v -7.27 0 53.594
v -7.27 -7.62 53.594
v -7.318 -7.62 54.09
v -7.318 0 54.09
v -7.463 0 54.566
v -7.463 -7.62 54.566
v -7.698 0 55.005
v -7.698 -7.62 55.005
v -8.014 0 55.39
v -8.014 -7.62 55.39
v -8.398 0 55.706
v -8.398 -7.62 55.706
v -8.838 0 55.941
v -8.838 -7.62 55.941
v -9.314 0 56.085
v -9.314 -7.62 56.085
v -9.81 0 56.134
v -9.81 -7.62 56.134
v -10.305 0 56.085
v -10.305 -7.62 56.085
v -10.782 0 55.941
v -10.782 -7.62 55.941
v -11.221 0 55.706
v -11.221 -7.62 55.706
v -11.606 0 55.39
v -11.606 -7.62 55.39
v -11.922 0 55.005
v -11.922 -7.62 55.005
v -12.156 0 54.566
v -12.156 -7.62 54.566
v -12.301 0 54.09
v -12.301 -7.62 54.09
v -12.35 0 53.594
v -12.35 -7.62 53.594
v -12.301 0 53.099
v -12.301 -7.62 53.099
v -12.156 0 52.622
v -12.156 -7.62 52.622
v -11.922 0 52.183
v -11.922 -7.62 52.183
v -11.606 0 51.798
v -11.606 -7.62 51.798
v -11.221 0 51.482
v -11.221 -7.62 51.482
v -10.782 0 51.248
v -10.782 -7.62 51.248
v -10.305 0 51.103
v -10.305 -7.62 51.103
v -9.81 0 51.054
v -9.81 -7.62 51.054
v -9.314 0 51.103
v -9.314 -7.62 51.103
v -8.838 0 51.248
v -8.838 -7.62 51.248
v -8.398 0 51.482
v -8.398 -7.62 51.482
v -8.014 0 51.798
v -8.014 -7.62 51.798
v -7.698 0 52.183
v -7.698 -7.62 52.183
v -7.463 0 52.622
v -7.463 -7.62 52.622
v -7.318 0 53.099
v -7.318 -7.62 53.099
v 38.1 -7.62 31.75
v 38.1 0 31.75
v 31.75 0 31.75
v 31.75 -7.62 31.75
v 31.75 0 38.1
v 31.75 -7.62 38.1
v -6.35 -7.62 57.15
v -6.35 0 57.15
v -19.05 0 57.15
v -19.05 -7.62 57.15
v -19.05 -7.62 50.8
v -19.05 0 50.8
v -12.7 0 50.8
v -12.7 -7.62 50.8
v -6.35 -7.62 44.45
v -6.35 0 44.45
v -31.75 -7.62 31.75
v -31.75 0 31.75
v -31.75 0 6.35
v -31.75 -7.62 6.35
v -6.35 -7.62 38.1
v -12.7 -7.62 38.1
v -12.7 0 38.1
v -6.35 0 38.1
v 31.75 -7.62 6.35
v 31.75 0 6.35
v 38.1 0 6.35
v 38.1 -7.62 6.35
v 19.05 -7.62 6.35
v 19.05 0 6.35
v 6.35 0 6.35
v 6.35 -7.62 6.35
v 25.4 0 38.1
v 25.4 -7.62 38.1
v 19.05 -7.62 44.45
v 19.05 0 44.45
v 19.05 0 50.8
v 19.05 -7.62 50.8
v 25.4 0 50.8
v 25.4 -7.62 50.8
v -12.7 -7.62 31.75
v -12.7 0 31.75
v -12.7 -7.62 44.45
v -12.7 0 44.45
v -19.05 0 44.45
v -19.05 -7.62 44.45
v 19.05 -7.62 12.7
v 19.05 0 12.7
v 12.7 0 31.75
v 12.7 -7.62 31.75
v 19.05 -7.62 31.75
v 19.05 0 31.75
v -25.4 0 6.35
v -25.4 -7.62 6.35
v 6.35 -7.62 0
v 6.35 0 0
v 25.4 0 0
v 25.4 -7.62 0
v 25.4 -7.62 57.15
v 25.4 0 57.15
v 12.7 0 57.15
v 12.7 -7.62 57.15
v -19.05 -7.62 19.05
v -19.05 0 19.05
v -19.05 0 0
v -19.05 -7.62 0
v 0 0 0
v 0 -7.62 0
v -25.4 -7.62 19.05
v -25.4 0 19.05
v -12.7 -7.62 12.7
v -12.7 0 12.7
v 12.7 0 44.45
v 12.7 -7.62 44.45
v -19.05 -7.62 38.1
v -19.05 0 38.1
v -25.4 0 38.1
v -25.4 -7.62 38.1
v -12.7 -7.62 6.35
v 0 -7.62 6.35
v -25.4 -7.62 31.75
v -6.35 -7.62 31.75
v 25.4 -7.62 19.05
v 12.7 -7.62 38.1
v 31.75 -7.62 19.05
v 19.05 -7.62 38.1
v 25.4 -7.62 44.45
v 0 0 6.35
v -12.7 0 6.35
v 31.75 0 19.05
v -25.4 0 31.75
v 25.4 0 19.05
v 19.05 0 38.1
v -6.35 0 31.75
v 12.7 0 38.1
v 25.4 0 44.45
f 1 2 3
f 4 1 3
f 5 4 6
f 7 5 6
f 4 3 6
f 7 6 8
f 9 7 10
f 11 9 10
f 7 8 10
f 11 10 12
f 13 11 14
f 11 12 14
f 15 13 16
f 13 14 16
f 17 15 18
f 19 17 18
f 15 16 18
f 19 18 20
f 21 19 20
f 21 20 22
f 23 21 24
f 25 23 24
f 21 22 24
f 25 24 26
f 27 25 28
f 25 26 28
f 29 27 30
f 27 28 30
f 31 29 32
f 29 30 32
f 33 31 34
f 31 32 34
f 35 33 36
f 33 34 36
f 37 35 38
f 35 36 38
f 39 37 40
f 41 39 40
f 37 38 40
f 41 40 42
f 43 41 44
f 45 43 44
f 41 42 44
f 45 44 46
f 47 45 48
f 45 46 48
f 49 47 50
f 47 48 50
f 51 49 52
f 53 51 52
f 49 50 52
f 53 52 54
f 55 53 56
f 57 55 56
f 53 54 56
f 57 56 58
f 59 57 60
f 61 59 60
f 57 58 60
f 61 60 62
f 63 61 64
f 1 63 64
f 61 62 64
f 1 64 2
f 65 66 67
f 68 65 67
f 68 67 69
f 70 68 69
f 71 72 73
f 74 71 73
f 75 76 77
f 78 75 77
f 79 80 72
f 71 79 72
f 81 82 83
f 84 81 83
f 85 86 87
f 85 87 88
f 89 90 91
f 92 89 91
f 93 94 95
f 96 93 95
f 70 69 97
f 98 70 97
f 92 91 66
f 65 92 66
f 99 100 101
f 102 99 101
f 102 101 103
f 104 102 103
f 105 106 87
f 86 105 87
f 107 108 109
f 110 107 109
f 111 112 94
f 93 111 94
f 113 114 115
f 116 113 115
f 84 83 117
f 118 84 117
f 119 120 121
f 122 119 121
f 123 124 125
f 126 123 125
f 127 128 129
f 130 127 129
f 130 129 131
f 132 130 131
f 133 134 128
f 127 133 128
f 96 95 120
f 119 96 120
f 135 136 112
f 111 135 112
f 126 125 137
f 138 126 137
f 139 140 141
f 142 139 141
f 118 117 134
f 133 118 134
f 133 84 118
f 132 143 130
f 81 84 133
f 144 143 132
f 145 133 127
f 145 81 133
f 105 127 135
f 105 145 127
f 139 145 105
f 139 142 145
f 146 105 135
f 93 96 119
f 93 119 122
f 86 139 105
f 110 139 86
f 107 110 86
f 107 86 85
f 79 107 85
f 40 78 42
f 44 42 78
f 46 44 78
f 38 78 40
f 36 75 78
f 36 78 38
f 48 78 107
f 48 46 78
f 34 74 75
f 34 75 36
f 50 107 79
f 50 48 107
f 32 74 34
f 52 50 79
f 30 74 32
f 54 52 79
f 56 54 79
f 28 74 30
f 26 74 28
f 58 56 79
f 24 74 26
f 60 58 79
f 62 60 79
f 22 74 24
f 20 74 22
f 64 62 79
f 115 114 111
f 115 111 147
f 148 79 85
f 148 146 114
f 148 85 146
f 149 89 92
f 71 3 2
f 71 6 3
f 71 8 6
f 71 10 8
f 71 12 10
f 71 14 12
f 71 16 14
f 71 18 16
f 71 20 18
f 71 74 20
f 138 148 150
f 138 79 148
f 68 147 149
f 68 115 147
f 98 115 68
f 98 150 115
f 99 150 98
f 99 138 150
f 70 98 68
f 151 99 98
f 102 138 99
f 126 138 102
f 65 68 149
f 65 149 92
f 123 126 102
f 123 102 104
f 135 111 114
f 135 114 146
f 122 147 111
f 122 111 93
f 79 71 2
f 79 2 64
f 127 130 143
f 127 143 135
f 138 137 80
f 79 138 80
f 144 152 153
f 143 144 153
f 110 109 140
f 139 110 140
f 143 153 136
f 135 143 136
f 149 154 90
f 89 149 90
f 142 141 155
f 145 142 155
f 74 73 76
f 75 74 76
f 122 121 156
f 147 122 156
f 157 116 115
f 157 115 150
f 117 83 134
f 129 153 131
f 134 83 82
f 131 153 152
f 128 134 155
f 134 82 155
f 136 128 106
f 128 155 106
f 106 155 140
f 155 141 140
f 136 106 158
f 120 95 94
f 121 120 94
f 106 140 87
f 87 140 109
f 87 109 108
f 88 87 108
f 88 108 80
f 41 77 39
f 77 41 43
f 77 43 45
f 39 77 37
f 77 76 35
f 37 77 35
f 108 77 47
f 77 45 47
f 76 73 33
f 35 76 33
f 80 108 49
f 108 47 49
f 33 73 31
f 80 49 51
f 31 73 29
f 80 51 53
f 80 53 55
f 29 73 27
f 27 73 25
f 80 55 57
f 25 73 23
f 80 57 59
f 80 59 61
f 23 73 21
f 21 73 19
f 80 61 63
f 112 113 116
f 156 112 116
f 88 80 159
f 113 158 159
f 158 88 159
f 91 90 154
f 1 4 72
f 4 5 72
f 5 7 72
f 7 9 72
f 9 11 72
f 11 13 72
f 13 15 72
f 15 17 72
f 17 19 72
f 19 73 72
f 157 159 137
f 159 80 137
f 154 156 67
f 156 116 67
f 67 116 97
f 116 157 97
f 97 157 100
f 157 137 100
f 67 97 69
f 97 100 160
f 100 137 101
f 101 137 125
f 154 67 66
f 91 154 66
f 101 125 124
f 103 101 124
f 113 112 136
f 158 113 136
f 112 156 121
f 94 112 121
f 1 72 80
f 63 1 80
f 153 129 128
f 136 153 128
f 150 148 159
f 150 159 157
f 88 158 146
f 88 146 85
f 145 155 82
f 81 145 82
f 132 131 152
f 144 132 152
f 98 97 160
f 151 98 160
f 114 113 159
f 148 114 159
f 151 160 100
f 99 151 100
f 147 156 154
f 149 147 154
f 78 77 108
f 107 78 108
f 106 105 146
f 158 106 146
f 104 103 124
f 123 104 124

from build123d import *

# Parameters (mm, degrees)
F1_DEPTH = 7.62
F2_W     = 6.35
F2_H     = 6.35
F3_DEPTH = 7.62
F4_R     = 2.54
F5_DEPTH = 7.62


with BuildPart() as f1:
    # F0 (on Front) → F1 (new body)
    with BuildSketch(Plane.XZ):
        Polygon((-19.05, 0), (0, 0), (0, 6.35), (-12.7, 6.35), (-12.7, 12.7), (19.05, 12.7), (19.05, 6.35), (6.35, 6.35), (6.35, 0), (25.4, 0), (25.4, 19.05), (31.75, 19.05), (31.75, 6.35), (38.1, 6.35), (38.1, 31.75), (31.75, 31.75), (31.75, 38.1), (25.4, 38.1), (25.4, 44.45), (19.05, 44.45), (19.05, 50.8), (25.4, 50.8), (25.4, 57.15), (12.7, 57.15), (12.7, 44.45), (-6.35, 44.45), (-6.35, 57.15), (-19.05, 57.15), (-19.05, 50.8), (-12.7, 50.8), (-12.7, 44.45), (-19.05, 44.45), (-19.05, 38.1), (-25.4, 38.1), (-25.4, 31.75), (-31.75, 31.75), (-31.75, 6.35), (-25.4, 6.35), (-25.4, 19.05), (-19.05, 19.05), align=None)
    extrude(amount=F1_DEPTH)

    # F2 (on face) → F3 (cut)
    with BuildSketch(Plane.XZ.offset(7.62)):
        with Locations((-9.525, 34.925)):
            Rectangle(F2_W, F2_H)
        with Locations((15.875, 34.925)):
            Rectangle(F2_W, F2_H)
    extrude(amount=-F3_DEPTH, mode=Mode.SUBTRACT)

    # F4 (on face) → F5 (cut)
    with BuildSketch(Plane.XZ.offset(7.62)):
        with Locations((-9.809578, 53.594287)):
            Circle(F4_R)
    extrude(amount=-F5_DEPTH, mode=Mode.SUBTRACT)


solid = f1.part
